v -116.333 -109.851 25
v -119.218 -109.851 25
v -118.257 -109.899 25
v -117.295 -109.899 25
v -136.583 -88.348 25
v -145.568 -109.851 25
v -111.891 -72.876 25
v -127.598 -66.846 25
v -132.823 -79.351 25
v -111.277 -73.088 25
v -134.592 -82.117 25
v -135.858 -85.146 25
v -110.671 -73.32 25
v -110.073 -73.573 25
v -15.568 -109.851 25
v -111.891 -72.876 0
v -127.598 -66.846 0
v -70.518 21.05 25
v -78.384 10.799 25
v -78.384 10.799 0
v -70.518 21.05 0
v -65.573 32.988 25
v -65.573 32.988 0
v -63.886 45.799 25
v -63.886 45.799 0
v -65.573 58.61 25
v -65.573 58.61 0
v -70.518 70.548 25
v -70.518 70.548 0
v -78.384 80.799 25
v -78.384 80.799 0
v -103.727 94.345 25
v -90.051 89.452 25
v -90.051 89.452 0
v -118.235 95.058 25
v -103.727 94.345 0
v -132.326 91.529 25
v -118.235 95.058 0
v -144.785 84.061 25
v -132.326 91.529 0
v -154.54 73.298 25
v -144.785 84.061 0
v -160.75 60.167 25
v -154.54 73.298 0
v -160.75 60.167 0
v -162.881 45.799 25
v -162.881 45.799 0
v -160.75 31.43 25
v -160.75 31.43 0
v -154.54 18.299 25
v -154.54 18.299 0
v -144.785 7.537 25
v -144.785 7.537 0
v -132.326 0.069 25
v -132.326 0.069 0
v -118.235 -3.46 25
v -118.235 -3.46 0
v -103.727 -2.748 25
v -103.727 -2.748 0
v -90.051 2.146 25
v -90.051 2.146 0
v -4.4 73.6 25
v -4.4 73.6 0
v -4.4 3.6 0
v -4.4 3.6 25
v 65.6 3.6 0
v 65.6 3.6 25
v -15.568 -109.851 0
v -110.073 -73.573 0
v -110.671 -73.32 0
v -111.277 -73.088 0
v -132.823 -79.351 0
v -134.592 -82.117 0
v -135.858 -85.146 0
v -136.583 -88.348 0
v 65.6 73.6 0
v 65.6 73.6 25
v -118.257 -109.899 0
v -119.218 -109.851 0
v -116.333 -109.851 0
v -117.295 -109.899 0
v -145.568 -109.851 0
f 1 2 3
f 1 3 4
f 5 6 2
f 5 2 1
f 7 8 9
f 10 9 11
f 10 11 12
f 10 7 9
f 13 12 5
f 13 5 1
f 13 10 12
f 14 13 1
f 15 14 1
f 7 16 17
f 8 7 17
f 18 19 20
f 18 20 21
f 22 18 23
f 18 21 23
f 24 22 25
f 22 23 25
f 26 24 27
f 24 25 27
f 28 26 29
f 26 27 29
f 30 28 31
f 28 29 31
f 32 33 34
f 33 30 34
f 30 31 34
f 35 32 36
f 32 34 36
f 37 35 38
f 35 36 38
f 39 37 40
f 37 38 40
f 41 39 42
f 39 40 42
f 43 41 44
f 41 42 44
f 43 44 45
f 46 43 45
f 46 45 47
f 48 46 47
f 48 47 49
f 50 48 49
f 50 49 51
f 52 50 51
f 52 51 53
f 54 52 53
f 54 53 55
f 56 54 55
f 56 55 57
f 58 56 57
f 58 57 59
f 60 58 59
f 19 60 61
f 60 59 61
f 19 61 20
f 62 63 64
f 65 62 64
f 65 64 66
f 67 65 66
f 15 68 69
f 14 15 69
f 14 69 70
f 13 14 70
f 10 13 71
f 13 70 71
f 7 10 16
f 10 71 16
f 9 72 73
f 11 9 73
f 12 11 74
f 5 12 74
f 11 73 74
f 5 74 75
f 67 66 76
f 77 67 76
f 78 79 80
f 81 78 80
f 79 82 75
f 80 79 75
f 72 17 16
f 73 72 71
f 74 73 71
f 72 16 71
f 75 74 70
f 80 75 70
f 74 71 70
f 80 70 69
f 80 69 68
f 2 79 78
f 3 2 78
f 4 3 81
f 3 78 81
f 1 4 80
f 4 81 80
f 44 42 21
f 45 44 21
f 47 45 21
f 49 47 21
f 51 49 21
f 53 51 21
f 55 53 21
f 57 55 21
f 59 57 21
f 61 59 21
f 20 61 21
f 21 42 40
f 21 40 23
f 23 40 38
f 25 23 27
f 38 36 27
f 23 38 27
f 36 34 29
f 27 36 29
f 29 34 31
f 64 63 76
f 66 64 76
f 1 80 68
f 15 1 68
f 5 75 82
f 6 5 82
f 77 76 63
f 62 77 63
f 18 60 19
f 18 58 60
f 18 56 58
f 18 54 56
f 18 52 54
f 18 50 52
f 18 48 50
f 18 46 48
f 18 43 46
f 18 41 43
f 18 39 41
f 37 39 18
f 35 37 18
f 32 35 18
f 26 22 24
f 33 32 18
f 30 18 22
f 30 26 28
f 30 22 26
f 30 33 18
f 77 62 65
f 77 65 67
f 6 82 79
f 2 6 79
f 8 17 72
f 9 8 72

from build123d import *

# Parameters (mm, degrees)
F0_W     = 70
F0_H     = 70
F1_DEPTH = 25


with BuildPart() as f1:
    # F0 (on Top) → F1 (new body)
    with BuildSketch(Plane.XY):
        with BuildLine():
            Line((-78.383885622, 80.7988221571), (-78.383885622, 10.7988221571))
            ThreePointArc((-78.383885622, 10.7988221571), (-67.6541818514, 26.856958652), (-63.886410939, 45.7988221571))
            ThreePointArc((-63.886410939, 45.7988221571), (-67.6541818514, 64.7406856622), (-78.383885622, 80.7988221571))
        make_face()
        with BuildLine():
            ThreePointArc((-148.383885622, 80.7988221571), (-162.8813603051, 45.7988221571), (-148.383885622, 10.7988221571))
            Line((-148.383885622, 10.7988221571), (-148.383885622, 80.7988221571))
        make_face()
        with BuildLine():
            Line((-148.383885622, 80.7988221571), (-78.383885622, 80.7988221571))
            ThreePointArc((-78.383885622, 80.7988221571), (-113.383885622, 95.2962968401), (-148.383885622, 80.7988221571))
        make_face()
        with BuildLine():
            ThreePointArc((-148.383885622, 10.7988221571), (-113.383885622, -3.698652526), (-78.383885622, 10.7988221571))
            Line((-78.383885622, 10.7988221571), (-148.383885622, 10.7988221571))
        make_face()
        with Locations((-113.383885622, 45.7988221571)):
            Rectangle(F0_W, F0_H)
    extrude(amount=F1_DEPTH)


with BuildPart() as f1b:
    # F0 (on Top) → F1, piece 2 (new body)
    with BuildSketch(Plane.XY):
        with BuildLine():
            Line((-136.5828293554, -88.3484685186), (-145.5680037656, -109.8505454913))
            Line((-145.5680037656, -109.8505454913), (-119.2181130045, -109.8505454913))
            ThreePointArc((-119.2181130045, -109.8505454913), (-132.5437753501, -102.8493614933), (-136.5828293554, -88.3484685186))
        make_face()
        with BuildLine():
            ThreePointArc((-98.793231582, -90.9229317547), (-103.8524497559, -103.8255462187), (-116.3333364352, -109.8505454913))
            Line((-116.3333364352, -109.8505454913), (-15.5680037656, -109.8505454913))
            Line((-15.5680037656, -109.8505454913), (-110.0732525797, -73.5733793495))
            ThreePointArc((-110.0732525797, -73.5733793495), (-101.8611532479, -80.5758809385), (-98.793231582, -90.9229317547))
        make_face()
        with BuildLine():
            Line((-127.5976549453, -66.8463915459), (-132.8228365818, -79.3505737261))
            ThreePointArc((-132.8228365818, -79.3505737261), (-123.385238193, -72.7882025226), (-111.8906605133, -72.8757418068))
            Line((-111.8906605133, -72.8757418068), (-127.5976549453, -66.8463915459))
        make_face()
        with BuildLine():
            ThreePointArc((-136.5828293554, -88.3484685186), (-132.5437753501, -102.8493614933), (-119.2181130045, -109.8505454913))
            Line((-119.2181130045, -109.8505454913), (-116.3333364352, -109.8505454913))
            ThreePointArc((-116.3333364352, -109.8505454913), (-103.8524497559, -103.8255462187), (-98.793231582, -90.9229317547))
            ThreePointArc((-98.793231582, -90.9229317547), (-101.8611532479, -80.5758809385), (-110.0732525797, -73.5733793495))
            Line((-110.0732525797, -73.5733793495), (-111.8906605133, -72.8757418068))
            ThreePointArc((-111.8906605133, -72.8757418068), (-123.385238193, -72.7882025226), (-132.8228365818, -79.3505737261))
            Line((-132.8228365818, -79.3505737261), (-136.5828293554, -88.3484685186))
        make_face()
        with BuildLine():
            Line((-116.3333364352, -109.8505454913), (-119.2181130045, -109.8505454913))
            ThreePointArc((-119.2181130045, -109.8505454913), (-117.7757247198, -109.9054248925), (-116.3333364352, -109.8505454913))
        make_face()
        with BuildLine():
            ThreePointArc((-110.0732525797, -73.5733793495), (-110.9730075768, -73.2012477151), (-111.8906605133, -72.8757418068))
            Line((-111.8906605133, -72.8757418068), (-110.0732525797, -73.5733793495))
        make_face()
        with BuildLine():
            ThreePointArc((-132.8228365818, -79.3505737261), (-135.2905048024, -83.603947919), (-136.5828293554, -88.3484685186))
            Line((-136.5828293554, -88.3484685186), (-132.8228365818, -79.3505737261))
        make_face()
    extrude(amount=F1_DEPTH)


with BuildPart() as f1c:
    # F0 (on Top) → F1, piece 3 (new body)
    with BuildSketch(Plane.XY):
        with BuildLine():
            Line((-4.3995198794, 73.5996038932), (-4.3995198794, 38.5996038932))
            ThreePointArc((-4.3995198794, 38.5996038932), (5.8517427791, 63.3483412348), (30.6004801206, 73.5996038932))
            Line((30.6004801206, 73.5996038932), (-4.3995198794, 73.5996038932))
        make_face()
        with BuildLine():
            ThreePointArc((30.6004801206, 73.5996038932), (55.3492174622, 63.3483412348), (65.6004801206, 38.5996038932))
            Line((65.6004801206, 38.5996038932), (65.6004801206, 73.5996038932))
            Line((65.6004801206, 73.5996038932), (30.6004801206, 73.5996038932))
        make_face()
        with BuildLine():
            Line((-4.3995198794, 3.5996038932), (30.6004801206, 3.5996038932))
            ThreePointArc((30.6004801206, 3.5996038932), (5.8517427791, 13.8508665517), (-4.3995198794, 38.5996038932))
            Line((-4.3995198794, 38.5996038932), (-4.3995198794, 3.5996038932))
        make_face()
        with BuildLine():
            Line((30.6004801206, 3.5996038932), (65.6004801206, 3.5996038932))
            Line((65.6004801206, 3.5996038932), (65.6004801206, 38.5996038932))
            ThreePointArc((65.6004801206, 38.5996038932), (55.3492174622, 13.8508665517), (30.6004801206, 3.5996038932))
        make_face()
        with BuildLine():
            ThreePointArc((-4.3995198794, 38.5996038932), (5.8517427791, 13.8508665517), (30.6004801206, 3.5996038932))
            ThreePointArc((30.6004801206, 3.5996038932), (55.3492174622, 13.8508665517), (65.6004801206, 38.5996038932))
            ThreePointArc((65.6004801206, 38.5996038932), (55.3492174622, 63.3483412348), (30.6004801206, 73.5996038932))
            ThreePointArc((30.6004801206, 73.5996038932), (5.8517427791, 63.3483412348), (-4.3995198794, 38.5996038932))
        make_face()
    extrude(amount=F1_DEPTH)


solid = Compound([f1.part, f1b.part, f1c.part])
